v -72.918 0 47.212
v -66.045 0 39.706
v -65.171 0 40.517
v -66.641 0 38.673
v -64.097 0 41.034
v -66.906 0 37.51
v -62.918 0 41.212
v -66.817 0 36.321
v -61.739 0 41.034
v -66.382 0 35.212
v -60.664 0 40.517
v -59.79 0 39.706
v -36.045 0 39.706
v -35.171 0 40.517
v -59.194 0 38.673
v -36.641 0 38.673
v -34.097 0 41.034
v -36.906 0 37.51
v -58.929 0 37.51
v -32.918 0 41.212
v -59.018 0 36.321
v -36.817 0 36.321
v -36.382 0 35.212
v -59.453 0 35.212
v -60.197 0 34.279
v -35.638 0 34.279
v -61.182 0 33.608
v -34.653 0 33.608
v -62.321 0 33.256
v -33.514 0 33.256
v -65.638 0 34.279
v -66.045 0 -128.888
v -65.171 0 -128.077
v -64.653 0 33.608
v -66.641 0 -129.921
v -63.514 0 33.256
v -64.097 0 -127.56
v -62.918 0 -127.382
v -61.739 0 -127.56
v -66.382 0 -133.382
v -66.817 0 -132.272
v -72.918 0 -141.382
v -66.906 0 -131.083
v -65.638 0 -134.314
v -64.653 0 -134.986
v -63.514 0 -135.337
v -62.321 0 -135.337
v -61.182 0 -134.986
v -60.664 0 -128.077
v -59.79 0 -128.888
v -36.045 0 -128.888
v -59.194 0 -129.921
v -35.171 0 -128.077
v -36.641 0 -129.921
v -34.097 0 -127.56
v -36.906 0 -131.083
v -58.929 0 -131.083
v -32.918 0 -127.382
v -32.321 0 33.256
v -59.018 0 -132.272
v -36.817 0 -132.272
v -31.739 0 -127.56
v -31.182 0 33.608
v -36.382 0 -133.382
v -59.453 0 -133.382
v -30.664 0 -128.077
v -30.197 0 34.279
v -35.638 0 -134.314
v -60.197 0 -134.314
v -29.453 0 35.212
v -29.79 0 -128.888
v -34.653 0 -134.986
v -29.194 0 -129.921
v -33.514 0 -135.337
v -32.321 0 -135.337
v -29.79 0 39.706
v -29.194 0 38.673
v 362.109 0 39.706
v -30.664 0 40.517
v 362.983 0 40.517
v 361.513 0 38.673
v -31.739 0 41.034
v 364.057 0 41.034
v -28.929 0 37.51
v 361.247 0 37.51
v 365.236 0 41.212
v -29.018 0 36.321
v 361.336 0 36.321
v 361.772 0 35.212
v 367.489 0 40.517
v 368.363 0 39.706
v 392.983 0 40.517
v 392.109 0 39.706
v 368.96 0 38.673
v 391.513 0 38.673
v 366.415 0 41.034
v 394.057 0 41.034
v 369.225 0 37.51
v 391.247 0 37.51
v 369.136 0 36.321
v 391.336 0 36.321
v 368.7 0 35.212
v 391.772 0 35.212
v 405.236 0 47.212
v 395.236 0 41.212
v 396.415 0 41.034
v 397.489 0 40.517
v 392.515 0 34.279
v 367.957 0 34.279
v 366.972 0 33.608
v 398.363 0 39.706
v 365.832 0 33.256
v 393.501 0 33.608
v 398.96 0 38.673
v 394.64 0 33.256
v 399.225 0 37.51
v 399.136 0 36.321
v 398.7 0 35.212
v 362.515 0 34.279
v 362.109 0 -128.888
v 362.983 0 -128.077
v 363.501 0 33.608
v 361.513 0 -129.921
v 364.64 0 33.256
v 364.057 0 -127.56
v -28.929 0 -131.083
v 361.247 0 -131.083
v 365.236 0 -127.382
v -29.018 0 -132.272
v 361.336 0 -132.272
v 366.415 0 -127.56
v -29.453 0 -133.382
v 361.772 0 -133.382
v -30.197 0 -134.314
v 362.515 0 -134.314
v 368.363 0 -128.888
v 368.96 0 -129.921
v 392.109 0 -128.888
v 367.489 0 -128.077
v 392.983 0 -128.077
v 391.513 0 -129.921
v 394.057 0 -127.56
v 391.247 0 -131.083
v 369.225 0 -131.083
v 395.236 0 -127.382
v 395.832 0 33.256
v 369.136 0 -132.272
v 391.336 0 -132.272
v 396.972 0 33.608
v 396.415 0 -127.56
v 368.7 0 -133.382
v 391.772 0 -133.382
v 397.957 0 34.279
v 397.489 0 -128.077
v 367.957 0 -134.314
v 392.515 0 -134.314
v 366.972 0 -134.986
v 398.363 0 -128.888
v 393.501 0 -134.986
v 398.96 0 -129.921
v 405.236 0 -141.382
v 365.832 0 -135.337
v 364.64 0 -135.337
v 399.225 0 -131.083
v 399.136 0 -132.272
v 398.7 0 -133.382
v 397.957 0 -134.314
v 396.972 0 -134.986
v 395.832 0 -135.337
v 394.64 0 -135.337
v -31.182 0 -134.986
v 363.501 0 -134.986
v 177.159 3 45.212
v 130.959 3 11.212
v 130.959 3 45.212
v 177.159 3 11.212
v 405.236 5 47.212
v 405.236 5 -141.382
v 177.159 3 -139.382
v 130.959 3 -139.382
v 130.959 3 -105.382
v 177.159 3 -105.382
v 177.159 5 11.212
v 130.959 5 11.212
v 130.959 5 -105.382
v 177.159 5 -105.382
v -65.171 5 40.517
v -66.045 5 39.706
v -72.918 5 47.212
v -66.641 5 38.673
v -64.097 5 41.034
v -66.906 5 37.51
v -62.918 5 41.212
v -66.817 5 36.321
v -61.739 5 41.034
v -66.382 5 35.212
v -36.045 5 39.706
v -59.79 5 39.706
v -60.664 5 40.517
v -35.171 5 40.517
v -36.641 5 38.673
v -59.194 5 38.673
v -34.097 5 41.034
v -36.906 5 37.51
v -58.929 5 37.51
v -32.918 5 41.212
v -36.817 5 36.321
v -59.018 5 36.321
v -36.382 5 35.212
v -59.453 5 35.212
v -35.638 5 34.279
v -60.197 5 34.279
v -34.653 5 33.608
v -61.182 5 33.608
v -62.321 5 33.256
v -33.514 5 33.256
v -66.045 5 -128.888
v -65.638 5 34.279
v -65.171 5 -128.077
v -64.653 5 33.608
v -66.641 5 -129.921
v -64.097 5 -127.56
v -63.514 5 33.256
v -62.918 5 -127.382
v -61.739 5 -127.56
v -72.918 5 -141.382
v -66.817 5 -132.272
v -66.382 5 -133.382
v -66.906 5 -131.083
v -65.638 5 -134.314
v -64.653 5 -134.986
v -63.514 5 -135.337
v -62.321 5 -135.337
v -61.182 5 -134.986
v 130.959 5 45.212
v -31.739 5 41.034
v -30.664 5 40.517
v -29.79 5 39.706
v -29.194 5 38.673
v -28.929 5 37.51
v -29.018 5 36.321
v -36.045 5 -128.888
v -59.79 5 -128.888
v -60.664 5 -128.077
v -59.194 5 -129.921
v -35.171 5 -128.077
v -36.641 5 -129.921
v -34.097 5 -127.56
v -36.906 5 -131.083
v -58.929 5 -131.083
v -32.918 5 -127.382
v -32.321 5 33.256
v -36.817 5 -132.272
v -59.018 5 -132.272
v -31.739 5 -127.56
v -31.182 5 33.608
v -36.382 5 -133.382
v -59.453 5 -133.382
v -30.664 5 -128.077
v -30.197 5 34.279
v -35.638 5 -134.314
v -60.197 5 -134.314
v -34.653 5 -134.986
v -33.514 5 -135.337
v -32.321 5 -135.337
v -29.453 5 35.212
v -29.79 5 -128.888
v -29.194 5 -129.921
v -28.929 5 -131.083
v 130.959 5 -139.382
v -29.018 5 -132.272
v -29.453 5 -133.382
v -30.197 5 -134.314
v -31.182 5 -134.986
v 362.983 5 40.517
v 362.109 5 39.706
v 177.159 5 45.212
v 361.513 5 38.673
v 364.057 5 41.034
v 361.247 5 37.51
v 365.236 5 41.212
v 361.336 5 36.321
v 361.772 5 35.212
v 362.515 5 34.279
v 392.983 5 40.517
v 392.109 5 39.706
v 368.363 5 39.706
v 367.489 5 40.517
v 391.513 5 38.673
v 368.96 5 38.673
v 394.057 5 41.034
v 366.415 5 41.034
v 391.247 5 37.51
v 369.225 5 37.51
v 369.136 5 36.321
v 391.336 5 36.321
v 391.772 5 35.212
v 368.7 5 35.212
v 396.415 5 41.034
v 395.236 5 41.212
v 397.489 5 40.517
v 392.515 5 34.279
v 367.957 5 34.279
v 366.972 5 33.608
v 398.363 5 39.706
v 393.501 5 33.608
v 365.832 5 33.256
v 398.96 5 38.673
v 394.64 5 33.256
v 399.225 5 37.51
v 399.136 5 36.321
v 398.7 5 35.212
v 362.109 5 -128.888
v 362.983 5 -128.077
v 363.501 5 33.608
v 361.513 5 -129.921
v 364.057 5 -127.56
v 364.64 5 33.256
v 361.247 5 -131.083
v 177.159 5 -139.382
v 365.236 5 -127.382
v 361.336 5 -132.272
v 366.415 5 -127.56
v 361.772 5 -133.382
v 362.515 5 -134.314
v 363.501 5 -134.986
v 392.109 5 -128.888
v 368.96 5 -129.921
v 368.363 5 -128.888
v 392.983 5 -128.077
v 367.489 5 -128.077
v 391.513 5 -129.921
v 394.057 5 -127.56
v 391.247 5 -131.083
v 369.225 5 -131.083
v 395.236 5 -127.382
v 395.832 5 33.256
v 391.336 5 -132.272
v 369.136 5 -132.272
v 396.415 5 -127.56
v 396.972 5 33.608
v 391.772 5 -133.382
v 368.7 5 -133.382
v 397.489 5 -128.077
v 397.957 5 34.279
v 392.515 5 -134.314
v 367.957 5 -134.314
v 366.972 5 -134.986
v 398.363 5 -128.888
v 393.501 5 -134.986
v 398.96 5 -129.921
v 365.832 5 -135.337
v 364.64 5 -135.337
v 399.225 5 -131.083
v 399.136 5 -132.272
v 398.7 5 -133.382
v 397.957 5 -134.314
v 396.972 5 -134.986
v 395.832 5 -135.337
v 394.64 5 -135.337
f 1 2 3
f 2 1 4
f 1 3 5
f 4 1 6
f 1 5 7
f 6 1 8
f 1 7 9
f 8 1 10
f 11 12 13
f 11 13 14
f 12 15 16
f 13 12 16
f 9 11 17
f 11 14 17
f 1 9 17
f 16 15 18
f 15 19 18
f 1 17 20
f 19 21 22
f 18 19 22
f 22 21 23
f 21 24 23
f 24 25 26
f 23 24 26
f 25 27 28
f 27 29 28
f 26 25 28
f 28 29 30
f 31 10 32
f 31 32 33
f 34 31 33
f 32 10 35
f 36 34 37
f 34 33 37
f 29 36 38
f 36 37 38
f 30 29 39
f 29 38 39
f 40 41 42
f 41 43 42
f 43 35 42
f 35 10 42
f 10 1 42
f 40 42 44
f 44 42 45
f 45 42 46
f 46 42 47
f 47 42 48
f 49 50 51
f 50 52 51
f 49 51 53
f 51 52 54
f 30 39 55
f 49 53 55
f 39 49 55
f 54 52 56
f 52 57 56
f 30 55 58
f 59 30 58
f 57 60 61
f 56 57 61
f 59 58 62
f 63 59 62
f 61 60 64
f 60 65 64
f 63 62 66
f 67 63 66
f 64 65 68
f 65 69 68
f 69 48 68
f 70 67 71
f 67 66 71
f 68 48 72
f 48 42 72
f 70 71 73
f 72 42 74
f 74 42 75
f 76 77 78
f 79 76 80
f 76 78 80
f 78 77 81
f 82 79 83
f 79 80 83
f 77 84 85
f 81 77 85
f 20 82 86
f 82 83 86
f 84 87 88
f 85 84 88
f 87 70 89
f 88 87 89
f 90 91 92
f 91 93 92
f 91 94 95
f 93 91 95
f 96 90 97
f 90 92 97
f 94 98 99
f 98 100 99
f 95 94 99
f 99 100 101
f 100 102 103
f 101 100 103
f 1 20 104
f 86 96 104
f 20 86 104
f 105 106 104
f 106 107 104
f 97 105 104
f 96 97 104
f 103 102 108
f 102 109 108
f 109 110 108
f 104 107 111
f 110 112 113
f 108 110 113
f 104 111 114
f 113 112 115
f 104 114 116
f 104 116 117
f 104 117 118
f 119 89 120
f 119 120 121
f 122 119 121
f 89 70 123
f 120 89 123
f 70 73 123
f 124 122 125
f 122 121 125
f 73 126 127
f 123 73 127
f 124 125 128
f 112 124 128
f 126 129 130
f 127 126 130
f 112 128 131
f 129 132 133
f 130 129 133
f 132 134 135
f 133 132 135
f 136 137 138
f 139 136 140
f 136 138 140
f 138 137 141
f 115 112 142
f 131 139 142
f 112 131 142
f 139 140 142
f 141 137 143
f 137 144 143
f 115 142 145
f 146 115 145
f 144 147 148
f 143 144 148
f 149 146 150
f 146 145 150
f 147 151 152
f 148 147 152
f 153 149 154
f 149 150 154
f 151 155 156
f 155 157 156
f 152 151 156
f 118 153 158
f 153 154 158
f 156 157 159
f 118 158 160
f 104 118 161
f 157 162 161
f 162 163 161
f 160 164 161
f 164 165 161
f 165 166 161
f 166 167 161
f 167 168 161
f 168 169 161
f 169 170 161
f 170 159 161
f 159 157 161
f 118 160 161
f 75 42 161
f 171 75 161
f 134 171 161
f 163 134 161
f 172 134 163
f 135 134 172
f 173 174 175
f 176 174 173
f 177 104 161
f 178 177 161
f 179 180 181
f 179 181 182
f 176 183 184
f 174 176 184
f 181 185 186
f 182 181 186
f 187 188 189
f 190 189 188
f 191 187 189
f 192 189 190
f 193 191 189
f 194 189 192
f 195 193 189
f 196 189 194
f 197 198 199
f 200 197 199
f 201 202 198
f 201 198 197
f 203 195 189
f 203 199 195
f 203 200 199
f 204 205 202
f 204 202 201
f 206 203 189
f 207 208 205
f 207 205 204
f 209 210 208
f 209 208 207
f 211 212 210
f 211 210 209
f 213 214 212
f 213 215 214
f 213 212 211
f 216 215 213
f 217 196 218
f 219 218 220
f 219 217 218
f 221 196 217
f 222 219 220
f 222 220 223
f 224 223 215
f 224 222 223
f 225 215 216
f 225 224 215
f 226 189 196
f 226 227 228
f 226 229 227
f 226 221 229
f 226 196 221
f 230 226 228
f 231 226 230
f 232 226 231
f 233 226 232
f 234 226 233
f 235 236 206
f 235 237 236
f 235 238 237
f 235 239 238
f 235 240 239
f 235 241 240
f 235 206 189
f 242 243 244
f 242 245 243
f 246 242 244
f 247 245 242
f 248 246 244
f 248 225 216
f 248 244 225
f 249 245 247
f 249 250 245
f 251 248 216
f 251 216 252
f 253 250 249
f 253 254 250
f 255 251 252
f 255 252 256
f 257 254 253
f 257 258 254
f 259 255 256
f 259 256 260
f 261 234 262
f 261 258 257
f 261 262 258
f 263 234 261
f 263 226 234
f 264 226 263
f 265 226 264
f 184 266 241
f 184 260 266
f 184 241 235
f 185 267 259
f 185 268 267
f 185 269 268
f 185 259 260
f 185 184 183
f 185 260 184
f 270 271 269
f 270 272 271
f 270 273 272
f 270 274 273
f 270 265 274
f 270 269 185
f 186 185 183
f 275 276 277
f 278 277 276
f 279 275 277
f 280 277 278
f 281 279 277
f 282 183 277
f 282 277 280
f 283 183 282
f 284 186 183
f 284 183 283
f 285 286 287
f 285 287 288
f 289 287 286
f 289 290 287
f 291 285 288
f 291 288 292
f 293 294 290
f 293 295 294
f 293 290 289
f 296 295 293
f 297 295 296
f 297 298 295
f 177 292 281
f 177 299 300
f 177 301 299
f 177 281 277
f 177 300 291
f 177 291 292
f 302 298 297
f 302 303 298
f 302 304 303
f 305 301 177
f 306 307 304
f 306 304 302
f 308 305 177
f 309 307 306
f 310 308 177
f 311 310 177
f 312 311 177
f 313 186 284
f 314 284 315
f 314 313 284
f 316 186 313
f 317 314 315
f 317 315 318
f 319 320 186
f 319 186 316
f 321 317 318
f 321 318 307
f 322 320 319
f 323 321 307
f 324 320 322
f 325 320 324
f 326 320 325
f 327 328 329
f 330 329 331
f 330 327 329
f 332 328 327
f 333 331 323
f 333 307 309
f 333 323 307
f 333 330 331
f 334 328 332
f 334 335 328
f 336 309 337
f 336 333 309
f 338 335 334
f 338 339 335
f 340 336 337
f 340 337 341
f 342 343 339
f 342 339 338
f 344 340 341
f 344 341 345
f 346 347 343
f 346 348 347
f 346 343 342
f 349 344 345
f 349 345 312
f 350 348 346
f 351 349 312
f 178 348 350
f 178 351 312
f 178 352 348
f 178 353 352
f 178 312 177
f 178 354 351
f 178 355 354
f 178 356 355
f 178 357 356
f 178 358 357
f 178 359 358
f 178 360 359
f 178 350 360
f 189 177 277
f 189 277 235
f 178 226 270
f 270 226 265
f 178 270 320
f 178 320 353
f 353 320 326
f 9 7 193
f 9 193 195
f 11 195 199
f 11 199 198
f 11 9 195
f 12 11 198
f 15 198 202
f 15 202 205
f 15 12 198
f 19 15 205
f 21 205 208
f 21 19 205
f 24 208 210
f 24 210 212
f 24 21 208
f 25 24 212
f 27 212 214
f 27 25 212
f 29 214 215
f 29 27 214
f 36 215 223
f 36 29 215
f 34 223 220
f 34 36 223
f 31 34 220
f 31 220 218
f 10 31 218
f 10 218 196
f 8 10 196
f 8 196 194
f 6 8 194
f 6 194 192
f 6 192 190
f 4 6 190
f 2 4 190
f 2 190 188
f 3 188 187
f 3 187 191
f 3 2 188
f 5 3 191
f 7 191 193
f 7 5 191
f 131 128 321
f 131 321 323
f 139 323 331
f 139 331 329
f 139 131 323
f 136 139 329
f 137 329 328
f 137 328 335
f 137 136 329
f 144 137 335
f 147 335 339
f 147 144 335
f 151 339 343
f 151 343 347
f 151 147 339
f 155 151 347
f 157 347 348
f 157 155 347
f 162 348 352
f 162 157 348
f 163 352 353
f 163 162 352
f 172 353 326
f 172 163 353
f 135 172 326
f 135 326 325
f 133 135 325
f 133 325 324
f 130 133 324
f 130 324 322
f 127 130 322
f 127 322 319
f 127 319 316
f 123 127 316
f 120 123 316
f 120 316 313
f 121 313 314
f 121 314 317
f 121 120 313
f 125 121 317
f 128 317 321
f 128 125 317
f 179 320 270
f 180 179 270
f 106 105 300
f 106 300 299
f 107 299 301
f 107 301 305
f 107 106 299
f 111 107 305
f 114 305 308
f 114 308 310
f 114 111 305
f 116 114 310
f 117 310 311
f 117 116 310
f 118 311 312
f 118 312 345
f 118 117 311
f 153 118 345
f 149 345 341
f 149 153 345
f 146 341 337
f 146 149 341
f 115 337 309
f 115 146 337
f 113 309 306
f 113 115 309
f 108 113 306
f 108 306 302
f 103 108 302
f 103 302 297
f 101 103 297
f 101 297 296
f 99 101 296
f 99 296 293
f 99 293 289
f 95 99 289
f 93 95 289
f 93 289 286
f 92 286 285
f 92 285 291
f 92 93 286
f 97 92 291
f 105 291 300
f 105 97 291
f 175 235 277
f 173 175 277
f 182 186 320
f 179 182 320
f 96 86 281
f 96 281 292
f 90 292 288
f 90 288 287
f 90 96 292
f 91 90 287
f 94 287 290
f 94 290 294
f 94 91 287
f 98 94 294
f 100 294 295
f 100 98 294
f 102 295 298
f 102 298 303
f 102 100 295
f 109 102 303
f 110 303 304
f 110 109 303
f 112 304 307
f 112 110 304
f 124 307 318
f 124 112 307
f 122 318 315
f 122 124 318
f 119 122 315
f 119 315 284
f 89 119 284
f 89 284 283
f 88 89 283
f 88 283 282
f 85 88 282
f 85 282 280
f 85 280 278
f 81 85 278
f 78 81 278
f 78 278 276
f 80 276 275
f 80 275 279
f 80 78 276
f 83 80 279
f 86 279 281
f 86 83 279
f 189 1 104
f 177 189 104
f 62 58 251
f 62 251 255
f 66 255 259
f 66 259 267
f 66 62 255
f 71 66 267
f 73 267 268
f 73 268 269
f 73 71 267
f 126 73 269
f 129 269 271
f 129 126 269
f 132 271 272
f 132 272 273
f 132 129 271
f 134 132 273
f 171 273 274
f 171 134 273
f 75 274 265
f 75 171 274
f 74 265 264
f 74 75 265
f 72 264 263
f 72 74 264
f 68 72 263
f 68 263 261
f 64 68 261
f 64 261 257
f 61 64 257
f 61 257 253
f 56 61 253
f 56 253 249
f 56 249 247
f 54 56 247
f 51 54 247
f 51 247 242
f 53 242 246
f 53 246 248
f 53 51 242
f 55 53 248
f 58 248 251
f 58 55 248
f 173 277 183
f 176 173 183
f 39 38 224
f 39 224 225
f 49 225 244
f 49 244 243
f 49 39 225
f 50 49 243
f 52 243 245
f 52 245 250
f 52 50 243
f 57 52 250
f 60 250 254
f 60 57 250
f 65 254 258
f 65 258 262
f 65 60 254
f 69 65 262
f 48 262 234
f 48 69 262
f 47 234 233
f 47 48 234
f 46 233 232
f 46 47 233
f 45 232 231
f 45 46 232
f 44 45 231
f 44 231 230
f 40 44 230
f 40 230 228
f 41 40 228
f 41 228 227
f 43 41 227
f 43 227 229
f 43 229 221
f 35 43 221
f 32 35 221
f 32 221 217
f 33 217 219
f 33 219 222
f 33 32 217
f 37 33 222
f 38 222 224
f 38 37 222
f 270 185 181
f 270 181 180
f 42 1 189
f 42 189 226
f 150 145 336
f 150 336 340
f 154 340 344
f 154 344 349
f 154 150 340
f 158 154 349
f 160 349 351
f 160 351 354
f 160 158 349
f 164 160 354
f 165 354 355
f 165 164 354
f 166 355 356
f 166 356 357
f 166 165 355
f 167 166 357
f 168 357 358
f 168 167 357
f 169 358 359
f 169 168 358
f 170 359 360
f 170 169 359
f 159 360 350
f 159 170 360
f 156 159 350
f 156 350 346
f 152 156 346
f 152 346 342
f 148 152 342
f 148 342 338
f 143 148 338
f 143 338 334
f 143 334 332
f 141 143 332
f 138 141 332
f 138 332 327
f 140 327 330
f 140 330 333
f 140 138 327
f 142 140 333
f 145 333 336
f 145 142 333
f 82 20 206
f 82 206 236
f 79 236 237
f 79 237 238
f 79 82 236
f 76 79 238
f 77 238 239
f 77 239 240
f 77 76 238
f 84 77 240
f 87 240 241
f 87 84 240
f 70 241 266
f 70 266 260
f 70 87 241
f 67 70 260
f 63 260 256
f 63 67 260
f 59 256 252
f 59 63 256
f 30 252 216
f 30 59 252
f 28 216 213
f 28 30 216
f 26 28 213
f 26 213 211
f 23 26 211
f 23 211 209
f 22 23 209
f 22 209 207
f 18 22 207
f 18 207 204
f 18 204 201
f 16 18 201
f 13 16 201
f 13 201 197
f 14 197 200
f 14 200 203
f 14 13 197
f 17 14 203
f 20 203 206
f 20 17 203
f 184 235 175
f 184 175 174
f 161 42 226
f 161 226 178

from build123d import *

# Parameters (mm, degrees)
ESQUISSE1_W             = 478.153686012
ESQUISSE1_H             = 188.593708553
ESQUISSE1_R             = 4
BOSS_EXTRU_4_DEPTH      = 5
ESQUISSE2_W             = 35.2
ESQUISSE2_H             = 34
ESQUISSE2_W_2           = 11
ENL_V_MAT_EXTRU_1_DEPTH = 2


with BuildPart() as part:
    # Esquisse1 → Boss.-Extru.4 (new body)
    with BuildSketch(Plane(origin=(0, 0, 0), x_dir=(1, 0, 0), z_dir=(0, 1, 0))):
        with Locations((166.159297522, 47.085285911)):
            Rectangle(ESQUISSE1_W, ESQUISSE1_H)
        with Locations(Location((395.236140528, -37.211568366, 0), (0, 0, 270))):
            Circle(ESQUISSE1_R, mode=Mode.SUBTRACT)
        with Locations(Location((-62.917545484, -37.211568366, 0), (0, 0, 270))):
            Circle(ESQUISSE1_R, mode=Mode.SUBTRACT)
        with Locations(Location((-32.917545484, -37.211568366, 0), (0, 0, 270))):
            Circle(ESQUISSE1_R, mode=Mode.SUBTRACT)
        with Locations(Location((365.236140528, -37.211568366, 0), (0, 0, 270))):
            Circle(ESQUISSE1_R, mode=Mode.SUBTRACT)
        with Locations(Location((-62.917545484, 131.382140187, 0), (0, 0, 270))):
            Circle(ESQUISSE1_R, mode=Mode.SUBTRACT)
        with Locations(Location((-32.917545484, 131.382140187, 0), (0, 0, 270))):
            Circle(ESQUISSE1_R, mode=Mode.SUBTRACT)
        with Locations(Location((365.236140528, 131.382140187, 0), (0, 0, 270))):
            Circle(ESQUISSE1_R, mode=Mode.SUBTRACT)
        with Locations(Location((395.236140528, 131.382140187, 0), (0, 0, 270))):
            Circle(ESQUISSE1_R, mode=Mode.SUBTRACT)
    extrude(amount=BOSS_EXTRU_4_DEPTH)

    # Esquisse2 → Enlèv. mat.-Extru.1 (cut)
    with BuildSketch(Plane(origin=(0, 5, 0), x_dir=(1, 0, 0), z_dir=(0, 1, 0))):
        with Locations((148.559297522, 122.382140187)):
            Rectangle(ESQUISSE2_W, ESQUISSE2_H)
        with Locations((171.659297522, 122.382140187)):
            Rectangle(ESQUISSE2_W_2, ESQUISSE2_H)
        with Locations((148.559297522, -28.211568366)):
            Rectangle(ESQUISSE2_W, ESQUISSE2_H)
        with Locations((171.659297522, -28.211568366)):
            Rectangle(ESQUISSE2_W_2, ESQUISSE2_H)
    extrude(amount=-ENL_V_MAT_EXTRU_1_DEPTH, mode=Mode.SUBTRACT)


solid = part.part
